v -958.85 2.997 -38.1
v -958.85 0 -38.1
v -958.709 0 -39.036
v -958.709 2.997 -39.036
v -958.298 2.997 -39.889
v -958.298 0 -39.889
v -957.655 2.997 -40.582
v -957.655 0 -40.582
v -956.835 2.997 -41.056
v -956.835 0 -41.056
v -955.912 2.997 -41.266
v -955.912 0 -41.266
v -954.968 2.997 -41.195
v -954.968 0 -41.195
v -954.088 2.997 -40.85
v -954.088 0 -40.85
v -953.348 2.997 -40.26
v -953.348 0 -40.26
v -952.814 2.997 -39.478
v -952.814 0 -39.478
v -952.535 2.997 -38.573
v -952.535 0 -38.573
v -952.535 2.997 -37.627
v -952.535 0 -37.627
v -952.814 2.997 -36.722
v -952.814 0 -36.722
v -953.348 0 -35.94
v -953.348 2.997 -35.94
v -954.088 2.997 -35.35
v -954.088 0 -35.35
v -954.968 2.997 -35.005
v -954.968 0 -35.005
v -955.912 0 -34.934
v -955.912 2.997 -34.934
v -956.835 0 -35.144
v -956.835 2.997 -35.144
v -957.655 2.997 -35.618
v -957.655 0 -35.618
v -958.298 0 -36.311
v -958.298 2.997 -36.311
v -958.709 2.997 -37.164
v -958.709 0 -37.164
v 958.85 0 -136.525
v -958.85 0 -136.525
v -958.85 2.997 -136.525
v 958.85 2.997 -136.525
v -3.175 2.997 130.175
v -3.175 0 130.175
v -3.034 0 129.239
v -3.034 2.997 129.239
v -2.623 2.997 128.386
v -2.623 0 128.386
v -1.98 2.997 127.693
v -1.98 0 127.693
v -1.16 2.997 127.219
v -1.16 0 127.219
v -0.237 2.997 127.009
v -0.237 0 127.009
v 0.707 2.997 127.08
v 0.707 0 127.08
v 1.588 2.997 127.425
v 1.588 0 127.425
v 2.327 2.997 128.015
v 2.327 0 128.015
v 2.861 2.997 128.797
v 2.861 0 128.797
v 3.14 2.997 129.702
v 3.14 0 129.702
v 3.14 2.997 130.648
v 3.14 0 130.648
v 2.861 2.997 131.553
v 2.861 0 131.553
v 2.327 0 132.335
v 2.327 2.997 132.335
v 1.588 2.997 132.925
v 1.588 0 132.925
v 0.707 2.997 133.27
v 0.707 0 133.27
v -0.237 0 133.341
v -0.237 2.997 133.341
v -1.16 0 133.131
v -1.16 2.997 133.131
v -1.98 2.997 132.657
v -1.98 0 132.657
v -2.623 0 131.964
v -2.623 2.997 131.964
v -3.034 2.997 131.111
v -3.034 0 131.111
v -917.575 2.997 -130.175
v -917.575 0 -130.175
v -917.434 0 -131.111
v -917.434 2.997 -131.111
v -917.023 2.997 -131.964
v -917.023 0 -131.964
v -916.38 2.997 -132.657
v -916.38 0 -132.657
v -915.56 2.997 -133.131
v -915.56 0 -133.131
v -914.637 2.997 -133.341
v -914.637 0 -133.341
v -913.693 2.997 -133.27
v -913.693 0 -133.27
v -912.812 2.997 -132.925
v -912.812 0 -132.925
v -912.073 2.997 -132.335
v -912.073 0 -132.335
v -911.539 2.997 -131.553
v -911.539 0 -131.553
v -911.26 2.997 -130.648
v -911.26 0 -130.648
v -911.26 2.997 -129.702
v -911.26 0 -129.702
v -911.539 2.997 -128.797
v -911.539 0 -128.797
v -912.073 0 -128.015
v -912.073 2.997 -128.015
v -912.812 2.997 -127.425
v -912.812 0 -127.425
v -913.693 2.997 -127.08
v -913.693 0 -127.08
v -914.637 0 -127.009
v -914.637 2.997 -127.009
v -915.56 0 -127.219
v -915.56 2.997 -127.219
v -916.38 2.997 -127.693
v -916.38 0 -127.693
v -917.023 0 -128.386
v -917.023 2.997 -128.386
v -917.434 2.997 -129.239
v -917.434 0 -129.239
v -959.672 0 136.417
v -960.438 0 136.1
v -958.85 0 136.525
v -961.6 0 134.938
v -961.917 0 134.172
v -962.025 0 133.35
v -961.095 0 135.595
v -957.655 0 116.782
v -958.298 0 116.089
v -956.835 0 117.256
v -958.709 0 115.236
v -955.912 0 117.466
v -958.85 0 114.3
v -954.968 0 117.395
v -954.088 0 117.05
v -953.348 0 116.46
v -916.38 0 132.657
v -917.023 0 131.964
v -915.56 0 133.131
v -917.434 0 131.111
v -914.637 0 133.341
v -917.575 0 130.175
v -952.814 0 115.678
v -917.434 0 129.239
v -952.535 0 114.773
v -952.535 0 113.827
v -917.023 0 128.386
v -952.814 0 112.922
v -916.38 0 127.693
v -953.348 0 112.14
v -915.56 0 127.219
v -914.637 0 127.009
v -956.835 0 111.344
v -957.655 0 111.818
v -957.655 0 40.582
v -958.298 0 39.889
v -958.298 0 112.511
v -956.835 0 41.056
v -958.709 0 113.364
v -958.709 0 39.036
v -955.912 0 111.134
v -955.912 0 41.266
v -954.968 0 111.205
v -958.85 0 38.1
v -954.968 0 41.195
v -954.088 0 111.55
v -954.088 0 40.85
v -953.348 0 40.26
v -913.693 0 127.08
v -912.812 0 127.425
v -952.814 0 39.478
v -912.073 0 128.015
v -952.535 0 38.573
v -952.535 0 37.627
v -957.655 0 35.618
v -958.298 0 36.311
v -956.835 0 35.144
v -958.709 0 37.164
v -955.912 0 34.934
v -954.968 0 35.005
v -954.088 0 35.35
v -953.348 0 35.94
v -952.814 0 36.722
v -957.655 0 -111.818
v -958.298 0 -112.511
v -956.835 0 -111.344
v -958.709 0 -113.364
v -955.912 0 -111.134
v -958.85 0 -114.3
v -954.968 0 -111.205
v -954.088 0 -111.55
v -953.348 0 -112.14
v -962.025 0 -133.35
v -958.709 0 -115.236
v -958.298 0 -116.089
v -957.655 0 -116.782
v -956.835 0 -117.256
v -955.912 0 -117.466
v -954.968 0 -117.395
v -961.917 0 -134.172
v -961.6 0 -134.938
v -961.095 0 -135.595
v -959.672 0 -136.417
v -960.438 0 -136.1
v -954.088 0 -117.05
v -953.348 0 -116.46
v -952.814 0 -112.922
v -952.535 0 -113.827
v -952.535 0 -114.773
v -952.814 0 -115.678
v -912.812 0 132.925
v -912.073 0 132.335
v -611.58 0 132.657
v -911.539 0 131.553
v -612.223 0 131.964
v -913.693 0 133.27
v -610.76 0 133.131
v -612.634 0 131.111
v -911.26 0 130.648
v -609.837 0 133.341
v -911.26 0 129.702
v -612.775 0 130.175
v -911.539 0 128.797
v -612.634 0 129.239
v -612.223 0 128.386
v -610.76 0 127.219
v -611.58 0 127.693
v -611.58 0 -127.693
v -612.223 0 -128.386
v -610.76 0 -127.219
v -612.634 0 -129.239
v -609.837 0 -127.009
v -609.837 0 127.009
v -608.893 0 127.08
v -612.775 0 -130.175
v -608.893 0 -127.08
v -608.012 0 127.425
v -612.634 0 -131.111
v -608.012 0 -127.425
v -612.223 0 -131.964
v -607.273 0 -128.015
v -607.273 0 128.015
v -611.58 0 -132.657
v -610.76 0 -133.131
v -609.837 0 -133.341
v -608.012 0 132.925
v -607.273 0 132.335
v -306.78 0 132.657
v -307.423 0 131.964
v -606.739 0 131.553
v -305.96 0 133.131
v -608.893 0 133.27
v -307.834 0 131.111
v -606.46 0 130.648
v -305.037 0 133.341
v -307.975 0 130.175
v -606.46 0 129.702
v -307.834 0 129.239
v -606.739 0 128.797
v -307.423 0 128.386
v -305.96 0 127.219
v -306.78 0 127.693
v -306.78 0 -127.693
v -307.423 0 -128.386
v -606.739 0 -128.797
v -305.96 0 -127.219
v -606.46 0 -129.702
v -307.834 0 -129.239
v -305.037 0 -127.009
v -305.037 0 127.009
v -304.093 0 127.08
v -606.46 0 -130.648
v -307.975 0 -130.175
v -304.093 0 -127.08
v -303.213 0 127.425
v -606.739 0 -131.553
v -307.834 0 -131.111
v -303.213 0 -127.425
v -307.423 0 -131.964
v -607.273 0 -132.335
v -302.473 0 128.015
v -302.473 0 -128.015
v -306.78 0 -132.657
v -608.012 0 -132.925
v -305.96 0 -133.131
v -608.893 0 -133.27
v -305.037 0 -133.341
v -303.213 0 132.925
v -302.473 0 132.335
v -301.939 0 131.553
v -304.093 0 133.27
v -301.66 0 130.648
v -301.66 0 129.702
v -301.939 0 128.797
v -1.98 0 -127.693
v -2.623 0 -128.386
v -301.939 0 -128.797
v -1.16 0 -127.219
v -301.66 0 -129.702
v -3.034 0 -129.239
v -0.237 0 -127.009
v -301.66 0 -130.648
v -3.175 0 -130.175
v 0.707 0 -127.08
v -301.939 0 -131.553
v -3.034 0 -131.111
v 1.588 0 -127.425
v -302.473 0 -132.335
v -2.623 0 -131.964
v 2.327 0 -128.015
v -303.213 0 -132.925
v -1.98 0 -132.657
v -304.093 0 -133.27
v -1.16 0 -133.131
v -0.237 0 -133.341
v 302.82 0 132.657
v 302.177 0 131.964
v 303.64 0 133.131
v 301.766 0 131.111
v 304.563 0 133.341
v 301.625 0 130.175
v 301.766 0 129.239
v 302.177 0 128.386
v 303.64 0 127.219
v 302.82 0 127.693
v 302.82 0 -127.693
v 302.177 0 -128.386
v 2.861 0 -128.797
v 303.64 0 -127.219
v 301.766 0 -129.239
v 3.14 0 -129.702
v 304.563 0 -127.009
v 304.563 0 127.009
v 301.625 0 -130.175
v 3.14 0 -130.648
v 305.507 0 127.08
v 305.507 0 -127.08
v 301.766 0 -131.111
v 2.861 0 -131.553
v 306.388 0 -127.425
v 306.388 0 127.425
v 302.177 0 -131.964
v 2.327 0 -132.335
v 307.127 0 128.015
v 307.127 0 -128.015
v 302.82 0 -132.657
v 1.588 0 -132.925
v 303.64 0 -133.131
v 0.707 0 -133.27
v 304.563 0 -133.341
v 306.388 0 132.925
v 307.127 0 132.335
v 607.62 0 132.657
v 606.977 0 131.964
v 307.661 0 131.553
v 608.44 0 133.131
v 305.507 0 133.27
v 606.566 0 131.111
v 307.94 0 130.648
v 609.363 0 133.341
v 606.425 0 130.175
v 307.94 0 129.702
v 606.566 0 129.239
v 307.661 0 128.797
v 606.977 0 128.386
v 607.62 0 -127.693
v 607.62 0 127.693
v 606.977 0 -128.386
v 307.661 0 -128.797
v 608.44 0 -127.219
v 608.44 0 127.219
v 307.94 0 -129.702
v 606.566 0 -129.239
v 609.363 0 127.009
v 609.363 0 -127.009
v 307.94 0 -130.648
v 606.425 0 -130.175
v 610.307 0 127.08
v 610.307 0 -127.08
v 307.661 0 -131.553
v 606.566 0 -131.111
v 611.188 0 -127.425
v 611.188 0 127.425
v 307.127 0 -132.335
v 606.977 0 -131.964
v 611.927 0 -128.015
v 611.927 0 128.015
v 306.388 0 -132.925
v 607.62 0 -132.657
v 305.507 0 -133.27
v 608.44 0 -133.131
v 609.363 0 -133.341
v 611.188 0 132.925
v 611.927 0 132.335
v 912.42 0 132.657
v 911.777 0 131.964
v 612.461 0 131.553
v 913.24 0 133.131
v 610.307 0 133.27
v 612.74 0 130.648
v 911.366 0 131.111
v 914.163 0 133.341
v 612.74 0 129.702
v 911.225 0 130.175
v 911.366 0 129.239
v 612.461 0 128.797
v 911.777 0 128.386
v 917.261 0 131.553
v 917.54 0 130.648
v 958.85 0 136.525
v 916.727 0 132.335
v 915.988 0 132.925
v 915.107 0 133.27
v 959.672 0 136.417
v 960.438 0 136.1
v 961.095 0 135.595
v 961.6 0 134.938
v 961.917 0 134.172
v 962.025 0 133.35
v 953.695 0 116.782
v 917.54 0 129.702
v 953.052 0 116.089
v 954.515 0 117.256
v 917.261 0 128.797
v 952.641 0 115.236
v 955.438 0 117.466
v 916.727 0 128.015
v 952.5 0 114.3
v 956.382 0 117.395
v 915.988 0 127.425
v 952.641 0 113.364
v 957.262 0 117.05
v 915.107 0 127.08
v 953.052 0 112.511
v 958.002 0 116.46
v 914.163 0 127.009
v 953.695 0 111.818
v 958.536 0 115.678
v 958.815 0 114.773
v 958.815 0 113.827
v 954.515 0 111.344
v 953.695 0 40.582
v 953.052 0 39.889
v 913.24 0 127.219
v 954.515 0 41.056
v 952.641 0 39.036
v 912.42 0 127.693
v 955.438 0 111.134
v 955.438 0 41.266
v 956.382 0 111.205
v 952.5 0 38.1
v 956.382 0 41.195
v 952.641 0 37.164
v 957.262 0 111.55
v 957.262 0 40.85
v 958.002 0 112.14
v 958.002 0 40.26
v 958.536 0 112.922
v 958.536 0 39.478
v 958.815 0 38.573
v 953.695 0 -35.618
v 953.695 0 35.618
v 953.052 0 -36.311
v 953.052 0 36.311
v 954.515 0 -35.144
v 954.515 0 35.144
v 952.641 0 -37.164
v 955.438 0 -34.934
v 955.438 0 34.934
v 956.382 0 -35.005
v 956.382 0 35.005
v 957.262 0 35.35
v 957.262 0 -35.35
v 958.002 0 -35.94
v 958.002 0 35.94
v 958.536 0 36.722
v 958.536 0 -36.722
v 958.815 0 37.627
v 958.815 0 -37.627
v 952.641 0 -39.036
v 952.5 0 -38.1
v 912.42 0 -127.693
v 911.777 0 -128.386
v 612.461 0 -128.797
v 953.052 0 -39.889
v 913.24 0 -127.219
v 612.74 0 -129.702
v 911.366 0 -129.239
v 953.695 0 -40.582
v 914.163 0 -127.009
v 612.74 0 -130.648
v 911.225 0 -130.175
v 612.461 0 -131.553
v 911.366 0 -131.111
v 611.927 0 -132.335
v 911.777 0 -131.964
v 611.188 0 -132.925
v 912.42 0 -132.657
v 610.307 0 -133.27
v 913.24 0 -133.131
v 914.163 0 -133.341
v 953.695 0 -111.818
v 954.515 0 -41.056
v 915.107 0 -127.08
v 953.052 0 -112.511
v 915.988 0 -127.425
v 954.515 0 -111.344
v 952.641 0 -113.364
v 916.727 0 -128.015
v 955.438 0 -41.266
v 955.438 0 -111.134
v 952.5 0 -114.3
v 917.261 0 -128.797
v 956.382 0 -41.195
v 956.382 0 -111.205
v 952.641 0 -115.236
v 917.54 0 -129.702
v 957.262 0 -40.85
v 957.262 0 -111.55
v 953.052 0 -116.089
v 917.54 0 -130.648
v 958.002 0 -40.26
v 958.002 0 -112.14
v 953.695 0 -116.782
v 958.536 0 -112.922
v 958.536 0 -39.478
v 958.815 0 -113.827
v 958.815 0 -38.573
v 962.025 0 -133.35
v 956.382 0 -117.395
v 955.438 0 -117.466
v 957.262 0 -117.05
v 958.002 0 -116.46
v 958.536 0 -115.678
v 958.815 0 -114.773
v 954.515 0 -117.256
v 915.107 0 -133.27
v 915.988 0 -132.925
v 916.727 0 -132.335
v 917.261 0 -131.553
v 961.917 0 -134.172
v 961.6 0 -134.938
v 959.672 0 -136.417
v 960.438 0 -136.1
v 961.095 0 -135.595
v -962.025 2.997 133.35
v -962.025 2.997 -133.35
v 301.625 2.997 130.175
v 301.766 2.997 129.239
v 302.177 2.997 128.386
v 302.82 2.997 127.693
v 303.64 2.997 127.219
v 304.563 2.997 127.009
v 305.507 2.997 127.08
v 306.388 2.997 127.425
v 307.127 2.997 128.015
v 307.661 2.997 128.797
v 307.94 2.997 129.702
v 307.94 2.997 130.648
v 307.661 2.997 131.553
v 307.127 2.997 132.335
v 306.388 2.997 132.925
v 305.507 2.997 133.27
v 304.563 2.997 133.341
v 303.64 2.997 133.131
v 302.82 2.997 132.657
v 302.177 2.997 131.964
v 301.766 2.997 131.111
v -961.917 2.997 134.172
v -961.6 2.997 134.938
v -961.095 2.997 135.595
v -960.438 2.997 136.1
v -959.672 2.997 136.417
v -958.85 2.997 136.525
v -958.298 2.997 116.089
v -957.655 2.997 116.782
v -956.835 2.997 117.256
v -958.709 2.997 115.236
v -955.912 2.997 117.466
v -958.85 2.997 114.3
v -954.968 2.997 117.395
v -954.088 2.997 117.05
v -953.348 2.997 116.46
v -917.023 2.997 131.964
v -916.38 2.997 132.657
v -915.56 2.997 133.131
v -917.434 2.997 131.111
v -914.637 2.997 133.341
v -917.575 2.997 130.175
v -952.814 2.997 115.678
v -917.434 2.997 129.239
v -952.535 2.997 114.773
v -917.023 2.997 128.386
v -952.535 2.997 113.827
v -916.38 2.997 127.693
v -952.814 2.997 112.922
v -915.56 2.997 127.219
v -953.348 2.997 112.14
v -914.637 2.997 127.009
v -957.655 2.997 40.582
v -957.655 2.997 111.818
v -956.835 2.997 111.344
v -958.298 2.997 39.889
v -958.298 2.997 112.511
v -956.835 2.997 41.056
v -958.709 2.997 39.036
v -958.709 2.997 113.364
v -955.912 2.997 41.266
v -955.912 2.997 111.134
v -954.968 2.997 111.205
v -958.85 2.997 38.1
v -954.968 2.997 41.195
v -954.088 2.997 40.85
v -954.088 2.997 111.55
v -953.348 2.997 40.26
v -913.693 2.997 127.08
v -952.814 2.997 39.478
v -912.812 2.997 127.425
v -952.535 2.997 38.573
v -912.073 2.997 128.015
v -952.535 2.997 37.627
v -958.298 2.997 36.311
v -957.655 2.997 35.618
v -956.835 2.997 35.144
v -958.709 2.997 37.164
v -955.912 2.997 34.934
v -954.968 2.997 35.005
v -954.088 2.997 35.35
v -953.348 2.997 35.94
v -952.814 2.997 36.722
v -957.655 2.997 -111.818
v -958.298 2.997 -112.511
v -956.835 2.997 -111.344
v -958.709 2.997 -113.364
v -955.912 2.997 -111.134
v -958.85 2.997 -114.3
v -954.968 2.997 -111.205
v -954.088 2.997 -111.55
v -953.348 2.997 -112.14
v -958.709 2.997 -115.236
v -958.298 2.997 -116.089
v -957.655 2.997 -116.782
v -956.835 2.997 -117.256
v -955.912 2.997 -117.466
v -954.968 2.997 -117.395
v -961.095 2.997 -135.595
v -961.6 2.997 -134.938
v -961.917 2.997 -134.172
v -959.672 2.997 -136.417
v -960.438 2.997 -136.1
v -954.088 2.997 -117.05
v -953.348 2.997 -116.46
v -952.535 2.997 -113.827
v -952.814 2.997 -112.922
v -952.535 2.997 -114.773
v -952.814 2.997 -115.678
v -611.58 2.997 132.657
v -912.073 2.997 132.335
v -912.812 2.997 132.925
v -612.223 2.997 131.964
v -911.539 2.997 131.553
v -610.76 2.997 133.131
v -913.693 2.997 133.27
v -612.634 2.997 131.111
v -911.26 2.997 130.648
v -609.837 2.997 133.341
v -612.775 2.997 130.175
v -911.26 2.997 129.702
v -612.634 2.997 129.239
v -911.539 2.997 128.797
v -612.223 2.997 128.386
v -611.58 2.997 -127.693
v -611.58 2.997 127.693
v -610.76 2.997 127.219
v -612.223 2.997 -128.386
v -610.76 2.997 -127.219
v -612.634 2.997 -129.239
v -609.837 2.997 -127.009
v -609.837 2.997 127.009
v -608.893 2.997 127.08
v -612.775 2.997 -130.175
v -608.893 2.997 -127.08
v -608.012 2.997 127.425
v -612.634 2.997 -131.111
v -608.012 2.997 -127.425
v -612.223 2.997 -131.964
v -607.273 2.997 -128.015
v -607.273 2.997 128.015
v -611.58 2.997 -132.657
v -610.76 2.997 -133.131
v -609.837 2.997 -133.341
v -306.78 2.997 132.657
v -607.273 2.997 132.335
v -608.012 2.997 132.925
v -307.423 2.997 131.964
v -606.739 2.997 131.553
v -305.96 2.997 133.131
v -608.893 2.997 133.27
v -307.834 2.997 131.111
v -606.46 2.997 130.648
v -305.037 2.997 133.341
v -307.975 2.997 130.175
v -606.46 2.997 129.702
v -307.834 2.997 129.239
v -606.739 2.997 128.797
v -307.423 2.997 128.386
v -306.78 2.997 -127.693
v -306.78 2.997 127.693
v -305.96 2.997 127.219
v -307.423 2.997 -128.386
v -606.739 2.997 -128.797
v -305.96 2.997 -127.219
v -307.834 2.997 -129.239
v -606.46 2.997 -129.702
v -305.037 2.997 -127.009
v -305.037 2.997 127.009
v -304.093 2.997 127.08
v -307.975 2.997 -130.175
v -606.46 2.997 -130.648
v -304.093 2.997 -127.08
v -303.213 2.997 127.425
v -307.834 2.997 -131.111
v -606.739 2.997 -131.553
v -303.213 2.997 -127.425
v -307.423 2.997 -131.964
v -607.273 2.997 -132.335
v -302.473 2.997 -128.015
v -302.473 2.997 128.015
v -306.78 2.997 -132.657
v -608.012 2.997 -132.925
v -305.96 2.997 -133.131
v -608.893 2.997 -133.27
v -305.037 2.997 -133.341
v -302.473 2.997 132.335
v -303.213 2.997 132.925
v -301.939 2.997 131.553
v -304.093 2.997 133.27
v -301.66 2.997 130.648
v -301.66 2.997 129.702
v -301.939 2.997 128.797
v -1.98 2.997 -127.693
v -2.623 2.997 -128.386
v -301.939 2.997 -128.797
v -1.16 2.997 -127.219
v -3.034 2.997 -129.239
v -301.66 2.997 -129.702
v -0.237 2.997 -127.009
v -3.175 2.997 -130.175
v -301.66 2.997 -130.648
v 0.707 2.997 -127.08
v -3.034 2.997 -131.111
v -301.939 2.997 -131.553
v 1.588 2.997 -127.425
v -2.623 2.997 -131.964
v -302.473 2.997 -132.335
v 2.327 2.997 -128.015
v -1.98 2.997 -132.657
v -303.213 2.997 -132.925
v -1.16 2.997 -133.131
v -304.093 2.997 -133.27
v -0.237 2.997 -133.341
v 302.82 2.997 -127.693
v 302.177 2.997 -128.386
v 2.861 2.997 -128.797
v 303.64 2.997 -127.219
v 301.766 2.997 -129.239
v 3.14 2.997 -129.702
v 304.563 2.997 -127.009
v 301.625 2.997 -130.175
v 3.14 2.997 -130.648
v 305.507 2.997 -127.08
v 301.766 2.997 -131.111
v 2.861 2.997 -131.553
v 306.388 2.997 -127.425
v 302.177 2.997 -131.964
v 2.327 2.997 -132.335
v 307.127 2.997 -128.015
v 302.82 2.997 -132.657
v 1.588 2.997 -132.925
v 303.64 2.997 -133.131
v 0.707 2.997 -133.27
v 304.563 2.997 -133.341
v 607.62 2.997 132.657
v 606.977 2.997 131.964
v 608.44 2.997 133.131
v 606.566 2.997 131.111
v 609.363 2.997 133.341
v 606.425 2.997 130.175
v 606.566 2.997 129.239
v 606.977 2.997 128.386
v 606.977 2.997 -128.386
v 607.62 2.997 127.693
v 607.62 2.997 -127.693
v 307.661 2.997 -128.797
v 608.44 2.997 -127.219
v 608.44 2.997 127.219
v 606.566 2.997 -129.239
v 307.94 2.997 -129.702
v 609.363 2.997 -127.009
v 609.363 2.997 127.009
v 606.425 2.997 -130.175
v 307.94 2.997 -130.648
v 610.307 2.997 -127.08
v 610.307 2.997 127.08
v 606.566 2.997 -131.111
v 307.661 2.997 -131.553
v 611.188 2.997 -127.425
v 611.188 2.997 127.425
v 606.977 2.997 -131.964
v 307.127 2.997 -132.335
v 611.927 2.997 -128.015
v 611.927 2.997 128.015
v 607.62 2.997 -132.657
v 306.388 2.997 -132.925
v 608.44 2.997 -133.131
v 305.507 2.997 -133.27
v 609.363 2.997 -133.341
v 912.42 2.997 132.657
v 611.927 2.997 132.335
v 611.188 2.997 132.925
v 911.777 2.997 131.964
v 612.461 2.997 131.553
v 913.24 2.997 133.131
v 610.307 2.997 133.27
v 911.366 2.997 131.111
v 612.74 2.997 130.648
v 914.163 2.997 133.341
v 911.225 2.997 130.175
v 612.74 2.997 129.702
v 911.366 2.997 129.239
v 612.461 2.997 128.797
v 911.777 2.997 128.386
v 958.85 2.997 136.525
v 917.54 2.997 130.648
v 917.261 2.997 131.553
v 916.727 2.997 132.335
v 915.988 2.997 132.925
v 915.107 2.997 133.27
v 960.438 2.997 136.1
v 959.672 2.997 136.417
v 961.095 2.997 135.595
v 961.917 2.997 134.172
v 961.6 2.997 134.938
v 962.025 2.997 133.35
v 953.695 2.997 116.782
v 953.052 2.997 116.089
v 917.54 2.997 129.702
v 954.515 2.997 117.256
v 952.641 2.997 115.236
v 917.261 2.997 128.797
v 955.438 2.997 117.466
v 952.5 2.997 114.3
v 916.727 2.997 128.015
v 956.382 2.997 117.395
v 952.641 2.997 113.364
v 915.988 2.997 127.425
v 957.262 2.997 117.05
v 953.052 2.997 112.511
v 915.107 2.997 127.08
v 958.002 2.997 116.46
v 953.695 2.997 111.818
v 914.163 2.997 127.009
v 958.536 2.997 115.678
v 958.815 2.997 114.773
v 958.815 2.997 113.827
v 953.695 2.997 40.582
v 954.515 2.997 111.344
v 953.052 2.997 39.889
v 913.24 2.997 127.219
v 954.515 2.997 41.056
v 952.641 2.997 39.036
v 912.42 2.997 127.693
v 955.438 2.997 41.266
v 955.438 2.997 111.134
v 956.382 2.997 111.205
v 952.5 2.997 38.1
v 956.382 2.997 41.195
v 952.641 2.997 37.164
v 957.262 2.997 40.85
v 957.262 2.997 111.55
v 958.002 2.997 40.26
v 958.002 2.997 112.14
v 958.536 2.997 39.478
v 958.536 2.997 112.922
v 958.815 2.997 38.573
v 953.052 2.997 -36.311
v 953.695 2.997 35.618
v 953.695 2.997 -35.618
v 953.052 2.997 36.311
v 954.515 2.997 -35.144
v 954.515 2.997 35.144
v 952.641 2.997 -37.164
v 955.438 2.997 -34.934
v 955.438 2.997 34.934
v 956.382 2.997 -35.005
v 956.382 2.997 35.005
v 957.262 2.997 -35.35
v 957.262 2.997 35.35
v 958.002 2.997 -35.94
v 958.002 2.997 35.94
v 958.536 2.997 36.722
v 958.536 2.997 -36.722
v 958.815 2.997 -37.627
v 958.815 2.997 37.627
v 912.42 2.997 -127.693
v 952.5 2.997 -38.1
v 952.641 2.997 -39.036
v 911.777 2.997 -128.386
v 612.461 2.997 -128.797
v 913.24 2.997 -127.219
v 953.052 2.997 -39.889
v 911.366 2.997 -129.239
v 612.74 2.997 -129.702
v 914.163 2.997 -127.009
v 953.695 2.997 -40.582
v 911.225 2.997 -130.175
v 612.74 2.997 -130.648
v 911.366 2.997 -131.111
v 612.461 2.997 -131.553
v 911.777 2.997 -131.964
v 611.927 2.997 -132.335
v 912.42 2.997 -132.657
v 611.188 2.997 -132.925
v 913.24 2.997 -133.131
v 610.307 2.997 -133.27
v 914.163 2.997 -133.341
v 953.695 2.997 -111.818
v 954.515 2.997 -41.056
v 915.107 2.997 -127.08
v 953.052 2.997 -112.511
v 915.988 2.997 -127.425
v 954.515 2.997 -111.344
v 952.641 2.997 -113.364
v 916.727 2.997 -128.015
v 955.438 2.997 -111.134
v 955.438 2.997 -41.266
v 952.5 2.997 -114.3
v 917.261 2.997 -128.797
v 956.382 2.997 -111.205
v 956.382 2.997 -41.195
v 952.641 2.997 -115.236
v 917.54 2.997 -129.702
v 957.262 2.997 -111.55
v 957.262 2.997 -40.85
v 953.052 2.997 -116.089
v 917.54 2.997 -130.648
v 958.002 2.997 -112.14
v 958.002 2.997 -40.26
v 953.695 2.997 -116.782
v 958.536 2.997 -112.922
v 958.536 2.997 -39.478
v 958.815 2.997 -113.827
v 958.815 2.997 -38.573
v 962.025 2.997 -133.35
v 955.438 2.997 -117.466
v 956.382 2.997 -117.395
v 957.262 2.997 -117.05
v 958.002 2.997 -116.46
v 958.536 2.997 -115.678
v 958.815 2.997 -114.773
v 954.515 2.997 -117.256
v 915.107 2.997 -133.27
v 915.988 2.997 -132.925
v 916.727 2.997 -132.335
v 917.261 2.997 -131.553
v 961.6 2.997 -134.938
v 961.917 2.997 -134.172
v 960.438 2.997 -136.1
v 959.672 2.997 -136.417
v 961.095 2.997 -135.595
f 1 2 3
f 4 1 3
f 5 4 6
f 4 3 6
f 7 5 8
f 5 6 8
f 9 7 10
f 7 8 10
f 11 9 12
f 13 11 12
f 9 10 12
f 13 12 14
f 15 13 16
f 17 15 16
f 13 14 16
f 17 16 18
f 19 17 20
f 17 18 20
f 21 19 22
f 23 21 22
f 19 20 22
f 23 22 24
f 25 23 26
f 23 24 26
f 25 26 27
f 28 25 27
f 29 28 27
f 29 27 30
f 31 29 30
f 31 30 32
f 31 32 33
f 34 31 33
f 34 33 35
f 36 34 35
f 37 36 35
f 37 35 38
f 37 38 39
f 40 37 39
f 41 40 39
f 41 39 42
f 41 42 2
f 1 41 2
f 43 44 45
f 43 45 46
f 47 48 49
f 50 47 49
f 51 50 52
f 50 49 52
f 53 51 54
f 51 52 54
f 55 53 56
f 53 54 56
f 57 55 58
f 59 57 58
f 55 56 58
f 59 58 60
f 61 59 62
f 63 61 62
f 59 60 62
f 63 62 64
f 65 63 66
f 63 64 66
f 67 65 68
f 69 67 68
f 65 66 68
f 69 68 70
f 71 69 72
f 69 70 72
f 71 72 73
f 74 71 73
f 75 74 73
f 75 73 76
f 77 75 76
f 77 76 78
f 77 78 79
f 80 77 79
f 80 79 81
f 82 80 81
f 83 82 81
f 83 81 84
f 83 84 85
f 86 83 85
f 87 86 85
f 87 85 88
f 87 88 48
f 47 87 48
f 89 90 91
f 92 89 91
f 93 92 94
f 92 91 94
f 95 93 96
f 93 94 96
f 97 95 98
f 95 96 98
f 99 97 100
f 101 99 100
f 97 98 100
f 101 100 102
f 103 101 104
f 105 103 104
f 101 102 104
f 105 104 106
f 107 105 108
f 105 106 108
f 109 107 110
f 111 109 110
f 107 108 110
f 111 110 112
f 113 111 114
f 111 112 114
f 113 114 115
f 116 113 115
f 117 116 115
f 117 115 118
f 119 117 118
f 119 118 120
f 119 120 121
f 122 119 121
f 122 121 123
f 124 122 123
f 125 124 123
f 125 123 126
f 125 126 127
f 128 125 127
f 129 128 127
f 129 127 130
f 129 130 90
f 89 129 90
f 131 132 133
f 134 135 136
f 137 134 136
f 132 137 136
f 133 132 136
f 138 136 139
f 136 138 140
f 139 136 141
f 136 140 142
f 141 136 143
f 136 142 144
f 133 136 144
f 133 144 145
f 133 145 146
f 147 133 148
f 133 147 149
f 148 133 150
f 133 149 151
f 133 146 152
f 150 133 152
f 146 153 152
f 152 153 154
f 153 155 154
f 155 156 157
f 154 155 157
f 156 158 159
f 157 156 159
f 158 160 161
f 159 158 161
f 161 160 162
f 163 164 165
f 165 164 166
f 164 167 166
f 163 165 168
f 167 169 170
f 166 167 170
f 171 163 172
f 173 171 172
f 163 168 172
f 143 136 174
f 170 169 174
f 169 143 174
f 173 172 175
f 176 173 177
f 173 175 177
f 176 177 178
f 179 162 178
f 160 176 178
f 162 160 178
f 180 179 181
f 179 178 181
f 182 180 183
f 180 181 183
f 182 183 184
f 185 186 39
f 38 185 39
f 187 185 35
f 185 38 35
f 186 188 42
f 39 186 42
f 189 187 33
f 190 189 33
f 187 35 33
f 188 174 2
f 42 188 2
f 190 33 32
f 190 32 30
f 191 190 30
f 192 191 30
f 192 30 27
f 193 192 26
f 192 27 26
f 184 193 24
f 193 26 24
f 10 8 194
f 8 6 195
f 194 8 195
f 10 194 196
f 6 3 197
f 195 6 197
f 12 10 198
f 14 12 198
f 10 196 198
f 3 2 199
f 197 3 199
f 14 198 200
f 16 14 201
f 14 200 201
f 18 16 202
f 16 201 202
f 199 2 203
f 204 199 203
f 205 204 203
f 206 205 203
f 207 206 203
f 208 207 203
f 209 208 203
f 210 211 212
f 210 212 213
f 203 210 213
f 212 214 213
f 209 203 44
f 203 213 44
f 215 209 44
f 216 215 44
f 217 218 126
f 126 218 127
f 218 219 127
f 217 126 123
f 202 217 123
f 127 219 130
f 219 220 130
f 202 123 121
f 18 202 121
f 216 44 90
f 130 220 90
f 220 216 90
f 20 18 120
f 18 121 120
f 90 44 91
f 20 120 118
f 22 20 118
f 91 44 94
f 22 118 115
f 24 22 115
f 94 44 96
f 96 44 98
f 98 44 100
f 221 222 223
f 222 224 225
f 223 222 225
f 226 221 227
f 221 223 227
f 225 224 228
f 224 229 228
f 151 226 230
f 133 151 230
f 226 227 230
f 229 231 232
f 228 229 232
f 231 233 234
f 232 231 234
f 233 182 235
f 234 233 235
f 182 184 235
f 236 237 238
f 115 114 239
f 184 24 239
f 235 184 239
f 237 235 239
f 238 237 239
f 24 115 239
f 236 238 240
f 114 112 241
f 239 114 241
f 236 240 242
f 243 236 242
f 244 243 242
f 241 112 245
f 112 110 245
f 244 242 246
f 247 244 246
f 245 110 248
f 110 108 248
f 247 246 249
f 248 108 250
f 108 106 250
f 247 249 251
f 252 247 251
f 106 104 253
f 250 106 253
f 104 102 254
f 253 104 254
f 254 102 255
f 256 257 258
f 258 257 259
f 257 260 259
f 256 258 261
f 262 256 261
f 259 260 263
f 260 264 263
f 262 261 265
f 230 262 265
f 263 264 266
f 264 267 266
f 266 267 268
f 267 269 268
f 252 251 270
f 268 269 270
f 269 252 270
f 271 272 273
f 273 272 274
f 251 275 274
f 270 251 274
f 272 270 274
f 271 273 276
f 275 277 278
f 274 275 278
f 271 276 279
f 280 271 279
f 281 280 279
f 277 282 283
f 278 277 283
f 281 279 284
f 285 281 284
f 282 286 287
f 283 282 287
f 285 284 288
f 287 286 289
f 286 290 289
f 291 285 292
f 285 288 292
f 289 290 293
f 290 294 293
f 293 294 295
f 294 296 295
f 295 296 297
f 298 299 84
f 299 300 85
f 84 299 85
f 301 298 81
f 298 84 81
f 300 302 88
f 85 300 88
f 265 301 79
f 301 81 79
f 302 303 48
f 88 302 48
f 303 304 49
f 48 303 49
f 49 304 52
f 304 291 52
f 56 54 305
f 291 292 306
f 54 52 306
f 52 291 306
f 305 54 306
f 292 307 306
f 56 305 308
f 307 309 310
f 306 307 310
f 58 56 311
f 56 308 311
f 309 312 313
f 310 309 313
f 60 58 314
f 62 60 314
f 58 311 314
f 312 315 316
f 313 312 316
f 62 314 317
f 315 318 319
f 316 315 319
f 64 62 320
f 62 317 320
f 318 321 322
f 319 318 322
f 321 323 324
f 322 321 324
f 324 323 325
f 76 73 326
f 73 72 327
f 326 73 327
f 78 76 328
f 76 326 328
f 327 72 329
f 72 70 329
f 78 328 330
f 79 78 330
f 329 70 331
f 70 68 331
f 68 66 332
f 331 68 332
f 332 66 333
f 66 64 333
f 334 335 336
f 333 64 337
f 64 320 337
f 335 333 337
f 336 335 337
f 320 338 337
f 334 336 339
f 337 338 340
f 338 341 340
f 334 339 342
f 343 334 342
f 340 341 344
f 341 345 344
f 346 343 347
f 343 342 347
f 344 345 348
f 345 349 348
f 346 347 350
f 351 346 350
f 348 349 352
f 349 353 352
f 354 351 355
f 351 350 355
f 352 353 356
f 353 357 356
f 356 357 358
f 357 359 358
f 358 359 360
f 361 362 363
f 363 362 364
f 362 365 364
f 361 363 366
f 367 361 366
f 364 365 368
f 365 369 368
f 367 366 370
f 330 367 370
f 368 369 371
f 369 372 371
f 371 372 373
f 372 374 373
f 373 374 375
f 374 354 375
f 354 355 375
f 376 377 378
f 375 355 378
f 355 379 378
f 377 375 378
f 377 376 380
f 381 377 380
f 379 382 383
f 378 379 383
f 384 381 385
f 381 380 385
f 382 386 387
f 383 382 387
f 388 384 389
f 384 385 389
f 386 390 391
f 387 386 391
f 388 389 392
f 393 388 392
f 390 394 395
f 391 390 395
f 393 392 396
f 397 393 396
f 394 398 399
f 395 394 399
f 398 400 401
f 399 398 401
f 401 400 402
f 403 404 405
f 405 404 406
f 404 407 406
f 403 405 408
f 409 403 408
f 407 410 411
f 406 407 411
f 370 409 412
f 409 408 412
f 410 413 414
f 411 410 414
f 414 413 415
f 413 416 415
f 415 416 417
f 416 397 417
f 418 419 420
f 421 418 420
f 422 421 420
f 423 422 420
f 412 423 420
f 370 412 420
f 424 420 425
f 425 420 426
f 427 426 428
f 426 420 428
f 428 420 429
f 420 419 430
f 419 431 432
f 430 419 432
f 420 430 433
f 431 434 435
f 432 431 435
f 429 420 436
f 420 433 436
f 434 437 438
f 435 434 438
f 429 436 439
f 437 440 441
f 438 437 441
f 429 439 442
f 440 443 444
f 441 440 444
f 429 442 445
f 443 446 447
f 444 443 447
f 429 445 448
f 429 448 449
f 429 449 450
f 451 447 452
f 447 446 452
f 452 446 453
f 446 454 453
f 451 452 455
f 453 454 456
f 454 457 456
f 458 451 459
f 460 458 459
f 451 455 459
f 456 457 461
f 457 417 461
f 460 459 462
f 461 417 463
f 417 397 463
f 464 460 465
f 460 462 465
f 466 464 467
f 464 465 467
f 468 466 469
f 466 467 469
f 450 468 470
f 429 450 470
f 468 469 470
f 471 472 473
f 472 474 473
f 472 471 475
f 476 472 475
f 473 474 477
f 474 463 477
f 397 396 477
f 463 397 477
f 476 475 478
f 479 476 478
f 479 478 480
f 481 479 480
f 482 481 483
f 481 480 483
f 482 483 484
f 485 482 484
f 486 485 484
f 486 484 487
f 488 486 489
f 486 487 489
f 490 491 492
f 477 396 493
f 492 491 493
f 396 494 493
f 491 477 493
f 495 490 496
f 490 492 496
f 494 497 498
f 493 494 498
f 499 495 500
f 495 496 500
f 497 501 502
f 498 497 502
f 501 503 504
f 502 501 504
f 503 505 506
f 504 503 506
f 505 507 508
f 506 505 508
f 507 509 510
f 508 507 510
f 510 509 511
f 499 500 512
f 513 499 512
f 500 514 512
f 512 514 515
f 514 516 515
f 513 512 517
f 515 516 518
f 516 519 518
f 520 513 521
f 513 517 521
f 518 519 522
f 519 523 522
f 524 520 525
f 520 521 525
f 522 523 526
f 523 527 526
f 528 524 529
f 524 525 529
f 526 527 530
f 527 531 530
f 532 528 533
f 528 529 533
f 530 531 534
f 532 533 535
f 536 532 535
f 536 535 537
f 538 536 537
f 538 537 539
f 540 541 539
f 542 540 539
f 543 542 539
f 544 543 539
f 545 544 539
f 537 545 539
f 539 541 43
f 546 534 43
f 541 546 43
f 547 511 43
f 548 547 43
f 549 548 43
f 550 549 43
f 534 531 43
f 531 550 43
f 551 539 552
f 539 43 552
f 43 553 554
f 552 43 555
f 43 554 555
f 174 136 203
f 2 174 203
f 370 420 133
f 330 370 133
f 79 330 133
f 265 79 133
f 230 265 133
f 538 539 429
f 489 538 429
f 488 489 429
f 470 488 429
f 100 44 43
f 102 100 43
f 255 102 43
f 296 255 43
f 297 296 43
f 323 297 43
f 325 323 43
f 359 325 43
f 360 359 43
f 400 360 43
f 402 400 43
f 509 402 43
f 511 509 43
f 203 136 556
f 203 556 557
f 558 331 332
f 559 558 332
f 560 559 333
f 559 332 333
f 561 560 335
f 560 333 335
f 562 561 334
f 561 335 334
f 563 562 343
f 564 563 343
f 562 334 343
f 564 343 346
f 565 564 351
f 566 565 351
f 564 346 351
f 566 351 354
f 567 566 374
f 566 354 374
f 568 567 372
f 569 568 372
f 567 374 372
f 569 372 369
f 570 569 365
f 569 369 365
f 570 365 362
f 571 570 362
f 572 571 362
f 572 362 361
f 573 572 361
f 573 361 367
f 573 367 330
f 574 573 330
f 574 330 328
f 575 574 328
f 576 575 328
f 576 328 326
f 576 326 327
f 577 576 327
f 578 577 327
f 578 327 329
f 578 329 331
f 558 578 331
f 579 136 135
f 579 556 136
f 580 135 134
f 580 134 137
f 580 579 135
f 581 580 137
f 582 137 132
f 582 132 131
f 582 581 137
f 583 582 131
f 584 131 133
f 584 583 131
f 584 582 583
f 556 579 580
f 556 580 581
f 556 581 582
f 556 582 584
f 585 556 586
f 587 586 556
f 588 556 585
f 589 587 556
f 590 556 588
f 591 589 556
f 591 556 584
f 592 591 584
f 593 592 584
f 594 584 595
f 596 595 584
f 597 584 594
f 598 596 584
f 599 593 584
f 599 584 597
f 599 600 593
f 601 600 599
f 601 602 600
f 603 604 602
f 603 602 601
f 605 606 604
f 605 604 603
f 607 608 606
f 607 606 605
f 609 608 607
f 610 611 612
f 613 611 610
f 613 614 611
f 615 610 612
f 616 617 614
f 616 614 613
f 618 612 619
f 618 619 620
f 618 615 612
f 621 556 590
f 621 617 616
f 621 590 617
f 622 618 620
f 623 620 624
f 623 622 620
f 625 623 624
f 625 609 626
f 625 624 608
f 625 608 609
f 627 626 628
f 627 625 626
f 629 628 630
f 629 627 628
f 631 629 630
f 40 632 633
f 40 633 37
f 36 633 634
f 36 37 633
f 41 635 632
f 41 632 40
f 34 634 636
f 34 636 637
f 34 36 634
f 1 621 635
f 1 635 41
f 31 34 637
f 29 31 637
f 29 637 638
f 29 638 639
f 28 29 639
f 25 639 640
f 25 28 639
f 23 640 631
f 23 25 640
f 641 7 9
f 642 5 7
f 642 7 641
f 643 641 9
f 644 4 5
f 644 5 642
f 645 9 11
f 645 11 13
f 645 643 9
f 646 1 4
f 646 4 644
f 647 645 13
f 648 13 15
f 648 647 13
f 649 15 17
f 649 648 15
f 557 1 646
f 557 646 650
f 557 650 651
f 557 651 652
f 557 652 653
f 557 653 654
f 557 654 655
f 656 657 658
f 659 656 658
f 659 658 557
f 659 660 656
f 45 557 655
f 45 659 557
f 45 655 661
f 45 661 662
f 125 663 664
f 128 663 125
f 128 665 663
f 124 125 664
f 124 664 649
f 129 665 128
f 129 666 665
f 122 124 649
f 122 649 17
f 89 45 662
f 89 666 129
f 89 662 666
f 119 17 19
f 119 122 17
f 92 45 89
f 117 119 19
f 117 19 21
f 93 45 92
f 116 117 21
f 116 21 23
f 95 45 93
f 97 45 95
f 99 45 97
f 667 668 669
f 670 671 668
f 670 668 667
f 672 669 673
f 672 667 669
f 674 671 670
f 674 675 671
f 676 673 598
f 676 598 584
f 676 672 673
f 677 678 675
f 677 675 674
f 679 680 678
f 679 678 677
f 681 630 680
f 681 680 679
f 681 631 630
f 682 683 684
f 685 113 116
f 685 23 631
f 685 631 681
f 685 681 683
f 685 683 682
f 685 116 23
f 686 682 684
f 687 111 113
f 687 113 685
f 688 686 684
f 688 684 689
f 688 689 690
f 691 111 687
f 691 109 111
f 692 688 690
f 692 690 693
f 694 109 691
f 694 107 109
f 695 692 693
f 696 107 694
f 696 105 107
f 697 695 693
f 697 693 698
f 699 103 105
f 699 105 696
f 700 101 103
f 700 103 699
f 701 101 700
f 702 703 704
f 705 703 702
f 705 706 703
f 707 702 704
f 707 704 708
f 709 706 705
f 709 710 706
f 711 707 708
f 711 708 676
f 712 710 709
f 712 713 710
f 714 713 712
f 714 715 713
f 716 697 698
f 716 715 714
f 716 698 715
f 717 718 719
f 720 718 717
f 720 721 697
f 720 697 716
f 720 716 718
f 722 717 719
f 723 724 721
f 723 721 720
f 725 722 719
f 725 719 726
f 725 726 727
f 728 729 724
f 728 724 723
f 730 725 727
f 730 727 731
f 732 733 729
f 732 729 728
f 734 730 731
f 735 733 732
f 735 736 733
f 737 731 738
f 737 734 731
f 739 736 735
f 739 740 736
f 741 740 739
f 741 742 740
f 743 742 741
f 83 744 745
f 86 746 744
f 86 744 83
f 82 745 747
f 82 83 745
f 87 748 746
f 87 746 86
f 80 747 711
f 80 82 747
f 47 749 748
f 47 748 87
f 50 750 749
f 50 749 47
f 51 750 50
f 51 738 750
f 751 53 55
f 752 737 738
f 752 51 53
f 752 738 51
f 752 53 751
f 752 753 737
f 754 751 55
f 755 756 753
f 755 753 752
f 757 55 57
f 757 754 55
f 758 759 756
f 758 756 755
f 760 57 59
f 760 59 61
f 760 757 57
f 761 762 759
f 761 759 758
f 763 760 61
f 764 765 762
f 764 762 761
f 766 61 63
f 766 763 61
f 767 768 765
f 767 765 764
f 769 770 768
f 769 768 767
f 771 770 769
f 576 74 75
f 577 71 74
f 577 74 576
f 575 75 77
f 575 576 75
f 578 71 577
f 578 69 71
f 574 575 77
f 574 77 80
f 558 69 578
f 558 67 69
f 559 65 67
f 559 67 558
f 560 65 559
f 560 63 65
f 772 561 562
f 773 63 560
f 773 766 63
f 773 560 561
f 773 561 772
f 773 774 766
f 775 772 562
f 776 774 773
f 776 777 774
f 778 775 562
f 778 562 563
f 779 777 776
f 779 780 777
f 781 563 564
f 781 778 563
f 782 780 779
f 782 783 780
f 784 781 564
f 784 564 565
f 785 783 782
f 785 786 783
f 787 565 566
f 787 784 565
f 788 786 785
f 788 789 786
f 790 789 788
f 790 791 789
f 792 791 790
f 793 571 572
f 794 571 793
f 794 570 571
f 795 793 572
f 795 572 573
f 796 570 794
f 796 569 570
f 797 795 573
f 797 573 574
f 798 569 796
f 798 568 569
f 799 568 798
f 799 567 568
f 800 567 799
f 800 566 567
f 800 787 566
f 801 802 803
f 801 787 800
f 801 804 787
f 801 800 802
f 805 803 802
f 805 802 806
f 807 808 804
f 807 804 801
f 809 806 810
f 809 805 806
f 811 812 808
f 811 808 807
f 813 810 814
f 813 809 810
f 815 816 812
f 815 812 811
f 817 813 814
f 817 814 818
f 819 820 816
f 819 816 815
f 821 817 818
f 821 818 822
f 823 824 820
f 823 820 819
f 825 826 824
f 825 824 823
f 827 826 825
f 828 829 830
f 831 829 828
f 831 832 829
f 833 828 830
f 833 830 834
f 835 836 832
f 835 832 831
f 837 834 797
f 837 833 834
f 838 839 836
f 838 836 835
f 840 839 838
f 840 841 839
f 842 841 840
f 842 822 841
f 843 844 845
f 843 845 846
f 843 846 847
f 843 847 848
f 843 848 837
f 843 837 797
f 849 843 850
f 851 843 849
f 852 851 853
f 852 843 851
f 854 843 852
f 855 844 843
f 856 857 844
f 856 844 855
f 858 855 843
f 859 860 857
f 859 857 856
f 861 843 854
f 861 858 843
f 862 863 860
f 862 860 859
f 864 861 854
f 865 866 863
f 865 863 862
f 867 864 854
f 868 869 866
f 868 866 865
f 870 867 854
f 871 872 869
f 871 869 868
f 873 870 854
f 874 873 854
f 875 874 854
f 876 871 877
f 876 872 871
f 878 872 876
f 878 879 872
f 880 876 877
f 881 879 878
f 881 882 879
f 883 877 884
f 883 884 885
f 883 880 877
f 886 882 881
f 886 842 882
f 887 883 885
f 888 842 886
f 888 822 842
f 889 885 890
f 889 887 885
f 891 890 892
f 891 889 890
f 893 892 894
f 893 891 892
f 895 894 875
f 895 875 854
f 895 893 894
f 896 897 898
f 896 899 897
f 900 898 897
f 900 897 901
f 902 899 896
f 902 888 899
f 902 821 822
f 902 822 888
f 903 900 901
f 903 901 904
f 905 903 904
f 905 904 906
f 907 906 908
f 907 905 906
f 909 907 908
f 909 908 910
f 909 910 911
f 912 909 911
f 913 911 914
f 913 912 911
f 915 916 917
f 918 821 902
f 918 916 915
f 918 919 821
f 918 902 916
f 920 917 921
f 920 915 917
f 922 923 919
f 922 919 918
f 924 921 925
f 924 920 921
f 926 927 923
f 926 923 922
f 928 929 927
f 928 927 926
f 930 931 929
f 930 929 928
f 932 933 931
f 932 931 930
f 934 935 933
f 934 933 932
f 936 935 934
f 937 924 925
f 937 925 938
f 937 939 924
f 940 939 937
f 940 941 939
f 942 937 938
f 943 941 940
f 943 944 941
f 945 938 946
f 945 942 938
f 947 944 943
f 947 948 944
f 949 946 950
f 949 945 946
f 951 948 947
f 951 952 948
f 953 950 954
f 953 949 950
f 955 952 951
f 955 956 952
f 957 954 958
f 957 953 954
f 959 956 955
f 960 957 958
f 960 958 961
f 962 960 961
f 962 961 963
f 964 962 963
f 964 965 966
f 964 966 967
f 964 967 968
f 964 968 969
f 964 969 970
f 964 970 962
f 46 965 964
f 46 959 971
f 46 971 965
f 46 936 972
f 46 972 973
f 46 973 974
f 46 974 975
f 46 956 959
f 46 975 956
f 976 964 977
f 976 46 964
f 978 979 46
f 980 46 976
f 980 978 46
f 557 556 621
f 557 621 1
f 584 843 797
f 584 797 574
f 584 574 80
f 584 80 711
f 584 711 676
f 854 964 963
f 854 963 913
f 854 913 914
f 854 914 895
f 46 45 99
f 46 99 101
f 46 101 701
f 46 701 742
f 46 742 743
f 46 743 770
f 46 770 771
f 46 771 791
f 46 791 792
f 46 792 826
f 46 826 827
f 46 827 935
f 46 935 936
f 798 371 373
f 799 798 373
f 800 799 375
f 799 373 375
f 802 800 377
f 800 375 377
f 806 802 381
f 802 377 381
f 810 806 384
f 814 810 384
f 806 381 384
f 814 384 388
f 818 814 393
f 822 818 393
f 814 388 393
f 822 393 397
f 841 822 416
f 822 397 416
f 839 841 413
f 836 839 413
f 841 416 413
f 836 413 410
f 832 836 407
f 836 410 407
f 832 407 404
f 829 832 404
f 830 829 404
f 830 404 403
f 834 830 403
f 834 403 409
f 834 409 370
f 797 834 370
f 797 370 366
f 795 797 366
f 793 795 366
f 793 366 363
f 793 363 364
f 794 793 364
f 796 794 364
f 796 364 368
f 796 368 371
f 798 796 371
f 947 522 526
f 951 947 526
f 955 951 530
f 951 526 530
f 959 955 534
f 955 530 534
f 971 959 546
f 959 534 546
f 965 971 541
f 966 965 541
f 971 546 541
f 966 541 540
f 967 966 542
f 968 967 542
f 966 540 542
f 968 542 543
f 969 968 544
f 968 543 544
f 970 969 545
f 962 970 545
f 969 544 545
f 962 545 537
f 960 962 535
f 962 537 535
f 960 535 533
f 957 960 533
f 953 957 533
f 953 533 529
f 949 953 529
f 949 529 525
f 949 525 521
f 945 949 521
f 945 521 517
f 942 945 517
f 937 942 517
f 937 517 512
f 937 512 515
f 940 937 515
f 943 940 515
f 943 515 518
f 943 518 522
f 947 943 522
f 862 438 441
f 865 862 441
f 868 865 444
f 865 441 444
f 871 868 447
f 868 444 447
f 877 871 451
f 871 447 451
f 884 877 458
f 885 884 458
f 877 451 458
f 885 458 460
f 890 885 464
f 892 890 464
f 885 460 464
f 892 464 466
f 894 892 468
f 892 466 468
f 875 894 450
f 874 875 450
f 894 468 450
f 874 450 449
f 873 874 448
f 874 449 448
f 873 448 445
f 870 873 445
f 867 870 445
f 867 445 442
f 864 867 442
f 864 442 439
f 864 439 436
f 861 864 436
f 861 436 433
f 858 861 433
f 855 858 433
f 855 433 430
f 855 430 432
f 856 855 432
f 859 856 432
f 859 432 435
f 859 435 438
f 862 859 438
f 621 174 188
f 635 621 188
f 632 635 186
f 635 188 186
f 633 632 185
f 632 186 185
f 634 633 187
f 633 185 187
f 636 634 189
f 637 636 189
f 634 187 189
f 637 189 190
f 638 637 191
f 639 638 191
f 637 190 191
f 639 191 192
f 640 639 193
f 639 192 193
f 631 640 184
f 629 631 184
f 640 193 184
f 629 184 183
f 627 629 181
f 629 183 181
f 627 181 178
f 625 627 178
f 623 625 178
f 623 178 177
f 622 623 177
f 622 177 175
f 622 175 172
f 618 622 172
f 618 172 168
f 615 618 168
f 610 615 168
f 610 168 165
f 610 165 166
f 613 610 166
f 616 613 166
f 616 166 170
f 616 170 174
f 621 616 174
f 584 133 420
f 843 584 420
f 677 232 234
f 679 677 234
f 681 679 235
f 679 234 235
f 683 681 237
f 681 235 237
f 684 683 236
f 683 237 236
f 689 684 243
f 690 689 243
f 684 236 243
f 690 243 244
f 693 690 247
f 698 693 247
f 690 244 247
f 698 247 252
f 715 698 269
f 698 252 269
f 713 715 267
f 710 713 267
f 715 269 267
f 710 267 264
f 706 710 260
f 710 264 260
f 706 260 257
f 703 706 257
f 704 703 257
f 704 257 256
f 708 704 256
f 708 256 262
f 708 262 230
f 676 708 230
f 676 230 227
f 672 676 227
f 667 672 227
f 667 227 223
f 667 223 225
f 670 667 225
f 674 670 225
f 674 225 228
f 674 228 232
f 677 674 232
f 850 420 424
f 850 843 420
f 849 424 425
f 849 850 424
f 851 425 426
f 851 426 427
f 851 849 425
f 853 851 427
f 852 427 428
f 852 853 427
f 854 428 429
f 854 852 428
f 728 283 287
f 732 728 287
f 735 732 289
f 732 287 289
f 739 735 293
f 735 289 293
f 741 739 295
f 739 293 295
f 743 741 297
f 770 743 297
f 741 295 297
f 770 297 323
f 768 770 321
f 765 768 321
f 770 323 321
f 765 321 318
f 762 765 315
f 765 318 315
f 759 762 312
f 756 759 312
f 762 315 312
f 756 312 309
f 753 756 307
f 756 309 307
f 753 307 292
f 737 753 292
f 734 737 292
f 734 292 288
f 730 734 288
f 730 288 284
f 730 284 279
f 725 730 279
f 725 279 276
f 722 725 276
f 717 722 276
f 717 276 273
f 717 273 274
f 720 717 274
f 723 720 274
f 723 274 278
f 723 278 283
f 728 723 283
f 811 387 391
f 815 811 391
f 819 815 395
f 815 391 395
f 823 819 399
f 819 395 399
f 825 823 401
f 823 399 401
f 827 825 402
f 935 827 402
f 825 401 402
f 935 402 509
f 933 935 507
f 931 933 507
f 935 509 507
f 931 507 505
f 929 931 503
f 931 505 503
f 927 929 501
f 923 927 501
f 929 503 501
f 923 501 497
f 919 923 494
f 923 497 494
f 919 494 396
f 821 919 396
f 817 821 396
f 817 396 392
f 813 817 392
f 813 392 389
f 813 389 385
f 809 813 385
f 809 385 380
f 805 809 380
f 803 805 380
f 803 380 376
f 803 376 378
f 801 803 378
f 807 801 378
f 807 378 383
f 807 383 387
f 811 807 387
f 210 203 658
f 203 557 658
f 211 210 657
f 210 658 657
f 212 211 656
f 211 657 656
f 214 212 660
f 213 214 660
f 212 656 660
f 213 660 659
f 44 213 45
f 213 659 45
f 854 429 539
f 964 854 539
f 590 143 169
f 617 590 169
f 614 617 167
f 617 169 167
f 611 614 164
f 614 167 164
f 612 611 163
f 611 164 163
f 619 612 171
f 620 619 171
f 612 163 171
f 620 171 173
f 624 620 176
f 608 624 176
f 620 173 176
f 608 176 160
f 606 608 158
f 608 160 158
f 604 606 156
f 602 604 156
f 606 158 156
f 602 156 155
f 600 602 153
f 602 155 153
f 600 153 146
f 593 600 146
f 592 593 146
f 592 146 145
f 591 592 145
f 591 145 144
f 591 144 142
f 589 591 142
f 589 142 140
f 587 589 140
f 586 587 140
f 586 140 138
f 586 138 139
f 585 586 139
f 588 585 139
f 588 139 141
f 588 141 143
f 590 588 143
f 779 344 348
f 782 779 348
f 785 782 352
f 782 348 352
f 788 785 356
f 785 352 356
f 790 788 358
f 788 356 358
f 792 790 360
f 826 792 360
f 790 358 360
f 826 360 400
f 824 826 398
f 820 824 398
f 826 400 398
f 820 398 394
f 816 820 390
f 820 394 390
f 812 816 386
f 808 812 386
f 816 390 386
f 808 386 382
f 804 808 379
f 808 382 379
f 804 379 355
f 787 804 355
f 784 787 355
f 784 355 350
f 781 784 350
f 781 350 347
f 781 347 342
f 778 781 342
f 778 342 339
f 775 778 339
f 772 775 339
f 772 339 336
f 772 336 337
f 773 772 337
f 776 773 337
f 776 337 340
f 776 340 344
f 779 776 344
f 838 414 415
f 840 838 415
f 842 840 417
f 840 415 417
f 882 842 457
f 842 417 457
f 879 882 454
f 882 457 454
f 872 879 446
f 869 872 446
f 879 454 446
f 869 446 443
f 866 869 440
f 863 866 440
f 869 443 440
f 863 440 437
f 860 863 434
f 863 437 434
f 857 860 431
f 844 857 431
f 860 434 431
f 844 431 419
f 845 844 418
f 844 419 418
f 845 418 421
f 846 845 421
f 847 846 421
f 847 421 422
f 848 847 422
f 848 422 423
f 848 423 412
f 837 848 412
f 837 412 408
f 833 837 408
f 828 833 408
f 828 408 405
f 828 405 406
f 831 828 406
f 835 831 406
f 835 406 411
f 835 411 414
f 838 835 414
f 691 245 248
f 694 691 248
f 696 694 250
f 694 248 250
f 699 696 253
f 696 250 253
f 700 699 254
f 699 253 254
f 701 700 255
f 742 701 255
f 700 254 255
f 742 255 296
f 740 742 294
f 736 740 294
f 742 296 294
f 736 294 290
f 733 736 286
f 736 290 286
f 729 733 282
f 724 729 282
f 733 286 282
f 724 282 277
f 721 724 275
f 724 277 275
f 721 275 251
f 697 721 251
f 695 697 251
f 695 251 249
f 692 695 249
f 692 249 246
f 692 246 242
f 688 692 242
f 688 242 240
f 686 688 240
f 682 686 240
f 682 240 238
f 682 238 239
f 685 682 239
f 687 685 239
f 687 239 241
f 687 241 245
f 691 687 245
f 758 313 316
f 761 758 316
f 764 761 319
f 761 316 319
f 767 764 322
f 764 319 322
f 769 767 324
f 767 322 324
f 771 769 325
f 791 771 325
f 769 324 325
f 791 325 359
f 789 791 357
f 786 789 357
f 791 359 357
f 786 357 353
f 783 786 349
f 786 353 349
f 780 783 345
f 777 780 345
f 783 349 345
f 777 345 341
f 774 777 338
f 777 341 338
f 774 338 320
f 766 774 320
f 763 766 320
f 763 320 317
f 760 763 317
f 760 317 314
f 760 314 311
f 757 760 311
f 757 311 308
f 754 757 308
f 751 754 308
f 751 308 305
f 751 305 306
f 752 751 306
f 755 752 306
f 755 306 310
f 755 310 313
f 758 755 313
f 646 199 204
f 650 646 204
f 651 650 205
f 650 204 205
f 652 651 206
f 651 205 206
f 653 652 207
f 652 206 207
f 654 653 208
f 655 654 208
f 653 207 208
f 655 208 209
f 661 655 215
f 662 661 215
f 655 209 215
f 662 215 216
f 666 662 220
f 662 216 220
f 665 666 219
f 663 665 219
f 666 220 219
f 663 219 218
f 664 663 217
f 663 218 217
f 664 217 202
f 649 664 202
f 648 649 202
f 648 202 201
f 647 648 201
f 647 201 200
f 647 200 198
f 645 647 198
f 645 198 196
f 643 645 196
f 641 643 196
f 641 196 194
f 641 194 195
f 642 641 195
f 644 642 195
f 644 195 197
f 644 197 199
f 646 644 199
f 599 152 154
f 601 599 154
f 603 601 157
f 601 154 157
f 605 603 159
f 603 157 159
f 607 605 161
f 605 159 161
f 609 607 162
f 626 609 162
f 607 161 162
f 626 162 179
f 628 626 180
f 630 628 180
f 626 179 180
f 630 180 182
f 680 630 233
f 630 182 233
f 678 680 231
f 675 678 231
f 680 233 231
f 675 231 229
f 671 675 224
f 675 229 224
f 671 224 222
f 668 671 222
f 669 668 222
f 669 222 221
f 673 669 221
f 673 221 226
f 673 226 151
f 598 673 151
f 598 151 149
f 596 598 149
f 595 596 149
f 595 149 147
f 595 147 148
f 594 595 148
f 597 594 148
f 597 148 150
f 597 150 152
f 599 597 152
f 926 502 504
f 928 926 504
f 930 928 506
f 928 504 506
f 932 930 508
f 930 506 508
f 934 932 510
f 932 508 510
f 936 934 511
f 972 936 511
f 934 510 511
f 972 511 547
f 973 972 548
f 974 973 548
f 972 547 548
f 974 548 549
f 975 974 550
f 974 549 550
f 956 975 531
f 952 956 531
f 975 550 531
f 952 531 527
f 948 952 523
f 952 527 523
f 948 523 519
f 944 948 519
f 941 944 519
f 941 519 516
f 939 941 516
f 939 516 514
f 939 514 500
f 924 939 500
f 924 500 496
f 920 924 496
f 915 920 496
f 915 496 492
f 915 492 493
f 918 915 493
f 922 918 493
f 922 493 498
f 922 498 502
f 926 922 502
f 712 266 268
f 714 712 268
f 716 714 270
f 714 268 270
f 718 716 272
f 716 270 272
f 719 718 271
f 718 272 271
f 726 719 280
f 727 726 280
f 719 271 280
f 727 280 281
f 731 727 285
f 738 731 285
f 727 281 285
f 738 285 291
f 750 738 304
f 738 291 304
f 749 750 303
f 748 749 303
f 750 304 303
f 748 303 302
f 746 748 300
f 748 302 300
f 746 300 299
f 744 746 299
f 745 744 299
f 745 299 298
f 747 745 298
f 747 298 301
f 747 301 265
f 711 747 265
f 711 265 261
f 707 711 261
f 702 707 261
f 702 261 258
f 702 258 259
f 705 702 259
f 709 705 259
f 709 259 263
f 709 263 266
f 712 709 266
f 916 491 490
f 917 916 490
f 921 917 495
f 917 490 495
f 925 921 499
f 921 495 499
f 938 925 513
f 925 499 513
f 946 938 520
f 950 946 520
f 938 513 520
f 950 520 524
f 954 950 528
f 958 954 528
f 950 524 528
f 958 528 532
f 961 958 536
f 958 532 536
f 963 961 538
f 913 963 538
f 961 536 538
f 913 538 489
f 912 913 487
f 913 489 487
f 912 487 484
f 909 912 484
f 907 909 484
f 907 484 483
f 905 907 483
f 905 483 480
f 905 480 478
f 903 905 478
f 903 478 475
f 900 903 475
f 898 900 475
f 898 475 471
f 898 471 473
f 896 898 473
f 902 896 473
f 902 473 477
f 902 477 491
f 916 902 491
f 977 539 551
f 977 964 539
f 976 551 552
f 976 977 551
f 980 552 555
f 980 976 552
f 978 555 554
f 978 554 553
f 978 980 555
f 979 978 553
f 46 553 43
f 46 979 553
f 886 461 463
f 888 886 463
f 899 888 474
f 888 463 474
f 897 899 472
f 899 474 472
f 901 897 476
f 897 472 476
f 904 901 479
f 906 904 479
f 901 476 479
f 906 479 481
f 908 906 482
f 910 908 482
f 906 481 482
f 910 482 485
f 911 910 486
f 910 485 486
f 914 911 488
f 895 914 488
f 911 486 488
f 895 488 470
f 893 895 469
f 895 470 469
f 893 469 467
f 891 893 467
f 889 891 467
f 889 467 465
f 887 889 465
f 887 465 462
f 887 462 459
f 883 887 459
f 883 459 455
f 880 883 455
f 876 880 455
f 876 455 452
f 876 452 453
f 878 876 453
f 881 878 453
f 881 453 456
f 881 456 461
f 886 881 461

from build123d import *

# Parameters (mm, degrees)
SKETCH1_W                   = 1924.05
SKETCH1_H                   = 273.05
BOSS_EXTRUDE1_DEPTH         = 2.9972
FILLET1_R                   = 3.175
F_1_4_0_25_DIAMETER_HOLE1_D = 6.35


with BuildPart() as part:
    # Sketch1 → Boss-Extrude1 (new body)
    with BuildSketch(Plane(origin=(0, 0, 0), x_dir=(1, 0, 0), z_dir=(0, 1, 0))):
        Rectangle(SKETCH1_W, SKETCH1_H)
    extrude(amount=BOSS_EXTRUDE1_DEPTH)

    # Fillet1
    fillet1_edges = [part.edges().sort_by_distance(p)[0] for p in [
        (962.025, 1.4986, 136.525),
        (-962.025, 1.4986, 136.525),
        (-962.025, 1.4986, -136.525),
        (962.025, 1.4986, -136.525),
    ]]
    fillet(fillet1_edges, radius=FILLET1_R)

    # 1/4 (0.25) Diameter Hole1 (through all)
    with Locations(Plane(origin=(0, 2.9972, 0), x_dir=(1, 0, 0), z_dir=(0, 1, 0))):
        with Locations((0, -130.175), (-955.675, 38.1), (-955.675, -38.1), (-914.4, -130.175), (-609.6, -130.175), (-304.8, -130.175), (304.8, -130.175), (609.6, -130.175), (914.4, -130.175), (-955.675, -114.3), (914.4, 130.175), (609.6, 130.175), (304.8, 130.175), (-304.8, 130.175), (-609.6, 130.175), (-914.4, 130.175), (0, 130.175), (955.675, -114.3), (955.675, -38.1), (955.675, 38.1), (-955.675, 114.3), (955.675, 114.3)):
            Hole(F_1_4_0_25_DIAMETER_HOLE1_D / 2)


solid = part.part
